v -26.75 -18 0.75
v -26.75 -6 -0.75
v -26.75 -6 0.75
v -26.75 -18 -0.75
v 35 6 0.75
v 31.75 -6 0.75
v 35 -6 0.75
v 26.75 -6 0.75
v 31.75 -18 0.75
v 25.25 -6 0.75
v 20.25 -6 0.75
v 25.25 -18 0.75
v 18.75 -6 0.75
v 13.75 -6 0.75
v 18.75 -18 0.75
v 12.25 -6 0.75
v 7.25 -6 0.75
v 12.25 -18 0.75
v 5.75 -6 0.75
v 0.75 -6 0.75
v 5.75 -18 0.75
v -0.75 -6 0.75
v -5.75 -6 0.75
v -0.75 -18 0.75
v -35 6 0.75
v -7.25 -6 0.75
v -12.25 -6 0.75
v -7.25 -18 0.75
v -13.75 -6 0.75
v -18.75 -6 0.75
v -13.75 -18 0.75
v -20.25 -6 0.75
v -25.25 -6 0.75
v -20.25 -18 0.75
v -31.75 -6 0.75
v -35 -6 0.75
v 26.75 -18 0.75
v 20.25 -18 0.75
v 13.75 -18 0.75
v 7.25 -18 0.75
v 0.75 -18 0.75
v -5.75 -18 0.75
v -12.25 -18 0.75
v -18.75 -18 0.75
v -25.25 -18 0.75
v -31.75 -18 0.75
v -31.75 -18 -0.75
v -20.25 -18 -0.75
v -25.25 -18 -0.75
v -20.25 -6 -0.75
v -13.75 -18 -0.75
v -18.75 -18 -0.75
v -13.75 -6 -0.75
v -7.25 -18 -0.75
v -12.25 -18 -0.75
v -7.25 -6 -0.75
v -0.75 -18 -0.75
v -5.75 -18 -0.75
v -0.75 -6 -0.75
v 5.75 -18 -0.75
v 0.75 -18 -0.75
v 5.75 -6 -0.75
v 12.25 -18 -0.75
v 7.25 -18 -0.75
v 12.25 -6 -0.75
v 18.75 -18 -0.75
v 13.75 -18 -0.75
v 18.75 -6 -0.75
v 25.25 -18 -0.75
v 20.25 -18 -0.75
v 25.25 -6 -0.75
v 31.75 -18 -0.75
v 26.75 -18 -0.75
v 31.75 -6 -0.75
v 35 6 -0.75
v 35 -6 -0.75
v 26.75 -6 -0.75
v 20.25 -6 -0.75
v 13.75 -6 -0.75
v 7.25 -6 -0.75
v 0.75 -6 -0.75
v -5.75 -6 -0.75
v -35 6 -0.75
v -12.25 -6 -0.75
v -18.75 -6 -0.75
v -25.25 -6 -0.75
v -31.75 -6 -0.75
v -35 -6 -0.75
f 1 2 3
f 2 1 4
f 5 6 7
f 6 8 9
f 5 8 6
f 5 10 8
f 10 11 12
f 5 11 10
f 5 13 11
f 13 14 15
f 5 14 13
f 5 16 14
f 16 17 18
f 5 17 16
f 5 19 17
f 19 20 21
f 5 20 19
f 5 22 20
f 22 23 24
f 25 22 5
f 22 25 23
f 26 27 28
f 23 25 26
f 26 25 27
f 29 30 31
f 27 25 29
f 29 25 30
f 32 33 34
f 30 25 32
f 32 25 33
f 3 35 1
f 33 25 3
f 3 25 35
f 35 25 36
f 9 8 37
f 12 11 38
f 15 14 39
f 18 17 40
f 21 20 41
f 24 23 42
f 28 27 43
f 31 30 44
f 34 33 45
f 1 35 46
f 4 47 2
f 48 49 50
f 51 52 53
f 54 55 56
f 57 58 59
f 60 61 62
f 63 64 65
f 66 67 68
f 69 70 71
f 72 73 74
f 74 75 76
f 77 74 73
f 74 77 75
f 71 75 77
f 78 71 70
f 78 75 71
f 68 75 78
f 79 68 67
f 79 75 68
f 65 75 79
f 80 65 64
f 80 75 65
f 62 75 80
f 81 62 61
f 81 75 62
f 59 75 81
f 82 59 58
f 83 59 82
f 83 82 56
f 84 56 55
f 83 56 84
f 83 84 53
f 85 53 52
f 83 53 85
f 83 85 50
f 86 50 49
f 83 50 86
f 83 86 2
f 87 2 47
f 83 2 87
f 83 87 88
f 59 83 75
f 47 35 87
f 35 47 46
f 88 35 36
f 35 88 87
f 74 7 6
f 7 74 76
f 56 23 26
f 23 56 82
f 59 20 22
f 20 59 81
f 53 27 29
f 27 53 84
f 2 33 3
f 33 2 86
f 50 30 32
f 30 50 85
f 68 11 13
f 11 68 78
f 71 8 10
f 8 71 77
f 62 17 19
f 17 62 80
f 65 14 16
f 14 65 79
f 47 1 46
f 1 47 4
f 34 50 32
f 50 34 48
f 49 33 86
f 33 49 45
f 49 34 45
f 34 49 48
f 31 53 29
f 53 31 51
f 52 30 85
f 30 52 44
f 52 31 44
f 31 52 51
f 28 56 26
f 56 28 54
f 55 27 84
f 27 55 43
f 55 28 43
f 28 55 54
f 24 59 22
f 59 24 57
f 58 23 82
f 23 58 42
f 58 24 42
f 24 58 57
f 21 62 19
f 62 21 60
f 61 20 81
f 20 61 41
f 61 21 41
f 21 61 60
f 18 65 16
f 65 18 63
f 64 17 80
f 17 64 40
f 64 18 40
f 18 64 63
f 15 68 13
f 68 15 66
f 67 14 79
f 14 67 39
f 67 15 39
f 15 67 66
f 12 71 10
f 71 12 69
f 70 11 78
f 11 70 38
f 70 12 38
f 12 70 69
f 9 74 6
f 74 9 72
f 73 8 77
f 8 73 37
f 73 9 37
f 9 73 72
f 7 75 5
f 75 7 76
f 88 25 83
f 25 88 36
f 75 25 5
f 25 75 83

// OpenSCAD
// Dimensions for 10-well agarose gel comb
$fn = 64;

// Spine (back bar)
spine_length = 70;   // X direction
spine_width = 12;      // Y direction
spine_thickness = 1.5; // Z direction

// Teeth
tooth_width = 5.0;     // X direction (width of each tooth)
tooth_length = 12;       // Y direction (length of each tooth)
tooth_gap = 1.5;       // Gap between adjacent teeth
num_teeth = 10;

// Calculate total tooth array width (including gaps)
total_teeth_width = num_teeth * tooth_width + (num_teeth - 1) * tooth_gap;

// Center teeth on spine in X direction
offset_x = (spine_length - total_teeth_width) / 2;

// Define the comb as a single solid body
module comb() {
    // Start with the spine
    translate([0, 0, 0])
        cube([spine_length, spine_width, spine_thickness], center = true);

    // Add teeth in a loop, positioned along the -Y edge of the spine
    for (i = [0 : num_teeth - 1]) {
        // Calculate X position of this tooth (centered on spine)
        tooth_x = -spine_length / 2 + offset_x + i * (tooth_width + tooth_gap) + tooth_width / 2;

        // Position tooth at the -Y edge of the spine (Y = -spine_width/2)
        // Each tooth extends from Y = -spine_width/2 to Y = -spine_width/2 - tooth_length
        translate([tooth_x, -spine_width/2 - tooth_length/2, 0])
            cube([tooth_width, tooth_length, spine_thickness], center = true);
    }
}

// Assemble the full comb
comb();
